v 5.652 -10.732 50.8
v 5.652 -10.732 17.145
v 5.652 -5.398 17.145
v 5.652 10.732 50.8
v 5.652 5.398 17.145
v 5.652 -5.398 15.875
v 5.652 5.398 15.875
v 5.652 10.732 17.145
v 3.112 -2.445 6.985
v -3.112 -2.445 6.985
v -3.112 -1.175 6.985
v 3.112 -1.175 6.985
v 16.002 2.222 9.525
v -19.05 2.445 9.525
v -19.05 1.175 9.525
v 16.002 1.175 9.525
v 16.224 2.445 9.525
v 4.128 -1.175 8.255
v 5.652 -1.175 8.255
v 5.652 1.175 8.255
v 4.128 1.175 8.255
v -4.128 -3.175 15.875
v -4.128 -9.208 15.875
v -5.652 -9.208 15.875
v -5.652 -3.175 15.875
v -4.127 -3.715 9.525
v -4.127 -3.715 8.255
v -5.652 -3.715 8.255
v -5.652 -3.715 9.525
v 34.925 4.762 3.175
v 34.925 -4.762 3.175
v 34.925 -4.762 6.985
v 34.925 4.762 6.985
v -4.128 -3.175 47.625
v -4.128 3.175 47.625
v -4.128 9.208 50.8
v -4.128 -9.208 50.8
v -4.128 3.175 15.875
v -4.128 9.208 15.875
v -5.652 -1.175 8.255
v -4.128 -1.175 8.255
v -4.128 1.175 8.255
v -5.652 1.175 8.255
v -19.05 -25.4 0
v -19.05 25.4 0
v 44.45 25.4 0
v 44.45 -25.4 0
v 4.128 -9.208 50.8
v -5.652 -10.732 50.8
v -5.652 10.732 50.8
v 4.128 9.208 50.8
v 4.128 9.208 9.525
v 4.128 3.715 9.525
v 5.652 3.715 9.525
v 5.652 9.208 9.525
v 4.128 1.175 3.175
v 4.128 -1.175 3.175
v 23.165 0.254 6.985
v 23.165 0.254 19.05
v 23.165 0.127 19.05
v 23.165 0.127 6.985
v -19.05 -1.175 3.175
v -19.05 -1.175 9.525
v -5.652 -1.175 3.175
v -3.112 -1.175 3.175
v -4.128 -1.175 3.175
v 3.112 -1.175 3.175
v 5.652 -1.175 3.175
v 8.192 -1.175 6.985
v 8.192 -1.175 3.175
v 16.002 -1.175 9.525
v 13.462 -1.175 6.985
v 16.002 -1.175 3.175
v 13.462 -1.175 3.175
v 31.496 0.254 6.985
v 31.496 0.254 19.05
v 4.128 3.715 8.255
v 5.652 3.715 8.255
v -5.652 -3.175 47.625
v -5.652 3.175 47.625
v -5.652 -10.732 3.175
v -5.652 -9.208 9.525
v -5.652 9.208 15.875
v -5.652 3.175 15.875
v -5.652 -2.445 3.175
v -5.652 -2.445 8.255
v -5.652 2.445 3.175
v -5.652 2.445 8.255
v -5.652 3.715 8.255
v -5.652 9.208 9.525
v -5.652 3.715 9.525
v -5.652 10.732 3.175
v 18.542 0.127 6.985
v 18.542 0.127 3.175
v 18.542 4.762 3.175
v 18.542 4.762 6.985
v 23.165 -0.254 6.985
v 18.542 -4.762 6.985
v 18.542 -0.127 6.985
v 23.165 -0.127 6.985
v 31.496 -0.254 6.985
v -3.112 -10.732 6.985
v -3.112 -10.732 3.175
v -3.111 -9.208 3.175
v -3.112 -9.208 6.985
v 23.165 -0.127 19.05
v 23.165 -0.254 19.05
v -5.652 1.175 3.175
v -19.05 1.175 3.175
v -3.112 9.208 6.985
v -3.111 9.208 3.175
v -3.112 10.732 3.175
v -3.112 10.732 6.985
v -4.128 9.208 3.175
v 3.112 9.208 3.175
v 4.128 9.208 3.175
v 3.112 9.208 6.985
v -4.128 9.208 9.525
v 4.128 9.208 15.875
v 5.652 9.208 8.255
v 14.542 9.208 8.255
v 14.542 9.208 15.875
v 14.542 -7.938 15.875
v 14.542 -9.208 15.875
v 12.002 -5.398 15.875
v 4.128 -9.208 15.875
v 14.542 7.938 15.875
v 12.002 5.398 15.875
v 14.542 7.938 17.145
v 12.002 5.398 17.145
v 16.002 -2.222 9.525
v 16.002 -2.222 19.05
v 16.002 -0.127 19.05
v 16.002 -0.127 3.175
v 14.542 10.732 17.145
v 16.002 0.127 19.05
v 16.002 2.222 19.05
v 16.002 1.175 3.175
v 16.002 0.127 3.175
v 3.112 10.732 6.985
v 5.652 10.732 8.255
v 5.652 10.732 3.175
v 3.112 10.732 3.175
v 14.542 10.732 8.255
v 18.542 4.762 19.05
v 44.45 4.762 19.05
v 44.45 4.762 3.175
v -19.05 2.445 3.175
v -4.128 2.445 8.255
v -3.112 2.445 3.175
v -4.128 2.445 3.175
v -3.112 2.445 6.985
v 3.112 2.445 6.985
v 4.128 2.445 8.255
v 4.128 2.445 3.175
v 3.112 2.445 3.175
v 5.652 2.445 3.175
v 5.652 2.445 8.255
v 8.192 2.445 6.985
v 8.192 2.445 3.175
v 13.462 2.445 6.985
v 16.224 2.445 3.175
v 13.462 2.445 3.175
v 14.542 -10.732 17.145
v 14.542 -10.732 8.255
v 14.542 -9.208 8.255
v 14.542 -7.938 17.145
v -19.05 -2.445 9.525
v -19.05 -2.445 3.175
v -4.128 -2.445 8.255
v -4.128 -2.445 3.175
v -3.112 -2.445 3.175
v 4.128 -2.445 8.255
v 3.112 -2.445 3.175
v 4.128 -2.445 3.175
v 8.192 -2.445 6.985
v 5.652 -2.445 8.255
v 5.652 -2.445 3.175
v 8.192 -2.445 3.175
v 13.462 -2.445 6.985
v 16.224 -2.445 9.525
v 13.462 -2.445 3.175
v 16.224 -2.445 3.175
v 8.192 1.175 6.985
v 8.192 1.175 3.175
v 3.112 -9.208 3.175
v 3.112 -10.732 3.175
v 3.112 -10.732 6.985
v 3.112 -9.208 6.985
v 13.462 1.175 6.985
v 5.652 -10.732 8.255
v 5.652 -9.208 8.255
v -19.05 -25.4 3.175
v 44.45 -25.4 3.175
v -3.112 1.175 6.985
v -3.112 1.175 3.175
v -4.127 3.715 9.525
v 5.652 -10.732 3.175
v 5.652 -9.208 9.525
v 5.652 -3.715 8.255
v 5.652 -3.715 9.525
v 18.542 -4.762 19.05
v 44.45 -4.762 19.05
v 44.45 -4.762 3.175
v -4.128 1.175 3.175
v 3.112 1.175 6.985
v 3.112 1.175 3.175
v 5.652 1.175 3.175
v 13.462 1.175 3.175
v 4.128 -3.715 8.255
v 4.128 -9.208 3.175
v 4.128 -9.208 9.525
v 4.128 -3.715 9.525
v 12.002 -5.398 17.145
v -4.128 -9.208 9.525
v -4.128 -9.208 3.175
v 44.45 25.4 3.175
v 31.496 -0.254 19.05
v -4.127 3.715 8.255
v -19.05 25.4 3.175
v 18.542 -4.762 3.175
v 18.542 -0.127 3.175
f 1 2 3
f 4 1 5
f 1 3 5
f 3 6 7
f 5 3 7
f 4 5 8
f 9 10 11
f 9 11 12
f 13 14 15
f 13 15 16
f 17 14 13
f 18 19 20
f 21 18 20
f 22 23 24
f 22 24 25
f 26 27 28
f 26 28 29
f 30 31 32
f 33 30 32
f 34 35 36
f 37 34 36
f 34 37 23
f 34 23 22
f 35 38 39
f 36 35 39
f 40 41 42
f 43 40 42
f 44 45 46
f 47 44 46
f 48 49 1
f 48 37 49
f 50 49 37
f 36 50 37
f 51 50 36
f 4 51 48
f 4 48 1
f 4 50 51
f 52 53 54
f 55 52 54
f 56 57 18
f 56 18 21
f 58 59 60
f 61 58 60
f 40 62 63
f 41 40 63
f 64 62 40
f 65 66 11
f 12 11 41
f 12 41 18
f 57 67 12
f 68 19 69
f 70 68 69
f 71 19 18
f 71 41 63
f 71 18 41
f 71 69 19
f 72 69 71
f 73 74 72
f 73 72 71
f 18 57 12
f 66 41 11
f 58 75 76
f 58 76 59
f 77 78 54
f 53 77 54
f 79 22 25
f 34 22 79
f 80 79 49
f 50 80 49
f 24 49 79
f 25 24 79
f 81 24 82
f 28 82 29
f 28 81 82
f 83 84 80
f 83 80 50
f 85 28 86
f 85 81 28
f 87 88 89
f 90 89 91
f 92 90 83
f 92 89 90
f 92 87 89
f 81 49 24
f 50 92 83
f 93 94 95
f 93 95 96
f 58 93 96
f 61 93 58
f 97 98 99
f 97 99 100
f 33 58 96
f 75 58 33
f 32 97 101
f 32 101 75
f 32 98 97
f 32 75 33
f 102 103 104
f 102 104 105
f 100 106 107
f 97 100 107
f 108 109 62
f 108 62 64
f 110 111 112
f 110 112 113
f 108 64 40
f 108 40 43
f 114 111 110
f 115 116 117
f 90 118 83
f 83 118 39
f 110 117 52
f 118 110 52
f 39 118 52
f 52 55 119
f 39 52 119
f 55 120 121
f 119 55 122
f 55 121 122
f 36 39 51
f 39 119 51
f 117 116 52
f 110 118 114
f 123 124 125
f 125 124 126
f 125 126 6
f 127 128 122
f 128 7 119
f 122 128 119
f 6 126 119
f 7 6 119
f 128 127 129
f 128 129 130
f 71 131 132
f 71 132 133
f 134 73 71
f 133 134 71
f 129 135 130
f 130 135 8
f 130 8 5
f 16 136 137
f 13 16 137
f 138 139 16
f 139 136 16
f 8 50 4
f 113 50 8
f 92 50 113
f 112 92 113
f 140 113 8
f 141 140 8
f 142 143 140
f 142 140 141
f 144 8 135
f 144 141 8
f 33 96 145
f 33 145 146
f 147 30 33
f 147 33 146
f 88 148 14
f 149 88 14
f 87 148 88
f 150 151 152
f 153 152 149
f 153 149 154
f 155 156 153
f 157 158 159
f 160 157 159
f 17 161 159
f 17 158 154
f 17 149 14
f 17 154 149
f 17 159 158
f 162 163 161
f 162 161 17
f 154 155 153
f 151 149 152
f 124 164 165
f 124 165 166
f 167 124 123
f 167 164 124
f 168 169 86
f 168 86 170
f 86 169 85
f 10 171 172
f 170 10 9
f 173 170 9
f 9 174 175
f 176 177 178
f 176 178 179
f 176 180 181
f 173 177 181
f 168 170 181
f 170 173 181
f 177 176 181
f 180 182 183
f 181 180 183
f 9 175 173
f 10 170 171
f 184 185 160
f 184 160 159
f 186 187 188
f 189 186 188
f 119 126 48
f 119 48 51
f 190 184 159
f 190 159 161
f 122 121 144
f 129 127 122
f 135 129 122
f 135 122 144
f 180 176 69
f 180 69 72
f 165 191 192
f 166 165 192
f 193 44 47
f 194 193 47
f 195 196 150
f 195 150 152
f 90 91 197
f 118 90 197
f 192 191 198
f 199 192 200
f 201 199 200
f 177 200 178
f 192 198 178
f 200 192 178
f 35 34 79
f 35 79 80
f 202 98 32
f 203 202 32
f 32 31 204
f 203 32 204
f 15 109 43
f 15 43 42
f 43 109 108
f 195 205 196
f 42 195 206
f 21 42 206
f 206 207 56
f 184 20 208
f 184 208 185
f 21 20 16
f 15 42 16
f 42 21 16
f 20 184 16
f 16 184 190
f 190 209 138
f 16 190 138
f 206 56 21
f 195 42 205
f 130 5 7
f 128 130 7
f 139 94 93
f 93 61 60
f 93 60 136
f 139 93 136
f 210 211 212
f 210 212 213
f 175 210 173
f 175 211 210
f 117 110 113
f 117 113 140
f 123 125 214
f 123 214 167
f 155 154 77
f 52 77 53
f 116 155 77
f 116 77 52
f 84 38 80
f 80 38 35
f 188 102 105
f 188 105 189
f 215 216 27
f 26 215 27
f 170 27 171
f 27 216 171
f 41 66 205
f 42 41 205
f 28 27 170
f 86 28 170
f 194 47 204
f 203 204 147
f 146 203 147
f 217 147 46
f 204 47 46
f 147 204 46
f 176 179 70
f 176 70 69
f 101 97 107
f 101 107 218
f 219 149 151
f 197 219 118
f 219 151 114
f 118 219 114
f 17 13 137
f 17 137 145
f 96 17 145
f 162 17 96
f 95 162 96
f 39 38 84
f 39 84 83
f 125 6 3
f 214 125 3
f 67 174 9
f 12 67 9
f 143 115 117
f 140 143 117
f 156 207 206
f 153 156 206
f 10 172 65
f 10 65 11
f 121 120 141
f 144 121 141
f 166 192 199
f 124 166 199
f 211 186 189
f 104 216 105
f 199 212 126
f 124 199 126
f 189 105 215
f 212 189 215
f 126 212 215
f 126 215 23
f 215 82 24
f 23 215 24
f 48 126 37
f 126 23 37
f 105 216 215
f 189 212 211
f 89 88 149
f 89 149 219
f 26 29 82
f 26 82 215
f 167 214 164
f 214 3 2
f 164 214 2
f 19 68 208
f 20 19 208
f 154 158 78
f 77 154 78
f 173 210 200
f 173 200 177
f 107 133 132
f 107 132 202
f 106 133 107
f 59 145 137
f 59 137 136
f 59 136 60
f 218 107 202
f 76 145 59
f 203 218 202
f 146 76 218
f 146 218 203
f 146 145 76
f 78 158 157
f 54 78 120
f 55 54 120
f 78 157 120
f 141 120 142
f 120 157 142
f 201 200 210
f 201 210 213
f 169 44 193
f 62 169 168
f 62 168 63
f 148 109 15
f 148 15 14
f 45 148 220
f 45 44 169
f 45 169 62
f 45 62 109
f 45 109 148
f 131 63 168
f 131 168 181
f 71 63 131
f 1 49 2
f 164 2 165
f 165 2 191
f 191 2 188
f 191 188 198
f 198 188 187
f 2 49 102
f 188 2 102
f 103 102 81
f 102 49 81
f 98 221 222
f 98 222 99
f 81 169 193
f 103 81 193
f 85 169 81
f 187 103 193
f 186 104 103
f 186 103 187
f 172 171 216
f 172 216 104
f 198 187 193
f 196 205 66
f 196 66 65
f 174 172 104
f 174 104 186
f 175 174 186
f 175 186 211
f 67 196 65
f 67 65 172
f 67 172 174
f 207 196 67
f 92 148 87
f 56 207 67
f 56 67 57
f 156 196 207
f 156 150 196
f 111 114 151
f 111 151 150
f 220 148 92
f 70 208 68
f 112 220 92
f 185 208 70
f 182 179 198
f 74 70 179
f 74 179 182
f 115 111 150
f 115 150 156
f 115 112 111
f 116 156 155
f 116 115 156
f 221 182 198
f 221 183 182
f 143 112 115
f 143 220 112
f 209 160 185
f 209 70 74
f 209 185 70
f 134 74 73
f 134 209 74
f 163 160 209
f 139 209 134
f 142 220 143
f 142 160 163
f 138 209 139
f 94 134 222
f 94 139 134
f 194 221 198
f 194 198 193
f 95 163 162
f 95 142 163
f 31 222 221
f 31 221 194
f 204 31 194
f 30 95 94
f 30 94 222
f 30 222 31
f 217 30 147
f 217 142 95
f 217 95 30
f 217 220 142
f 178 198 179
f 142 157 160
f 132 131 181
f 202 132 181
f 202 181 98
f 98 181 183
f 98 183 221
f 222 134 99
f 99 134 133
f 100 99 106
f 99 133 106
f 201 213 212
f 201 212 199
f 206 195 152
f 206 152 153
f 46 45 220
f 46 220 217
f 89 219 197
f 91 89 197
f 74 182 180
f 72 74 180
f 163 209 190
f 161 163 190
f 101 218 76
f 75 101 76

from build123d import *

# Parameters (mm, degrees)
F0_W          = 11.303
F0_H          = 21.463
F0_W_2        = 8.255
F0_H_2        = 18.415
F1_DEPTH      = 50.8
F2_W          = 18.415
F2_H          = 6.35
F3_DEPTH      = 12.7
F4_W          = 6.35
F4_H          = 31.75
F5_DEPTH      = 25.4
F6_W          = 63.5
F6_H          = 50.8
F7_DEPTH      = 3.175
F8_W          = 28.448
F8_H          = 9.525
F9_DEPTH      = 15.875
F11_DEPTH     = 15.875
F12_W         = 35.052
F12_H         = 1.27
F13_DEPTH     = 6.35
F14_W         = 1.27
F14_H         = 1.27
F14_W_2       = 2.3495
F15_DEPTH     = 24.7025
F16_W         = 6.223
F16_H         = 3.81
F16_W_2       = 5.2705
F16_W_3       = 16.383
F17_DEPTH     = 36.1325
F19_DEPTH     = 8.89
F20_T1_DEPTH  = 14.3341495789
F20_T6_DEPTH  = 22.4070747894
F20_T11_DEPTH = 28.9391495789
F20_T16_DEPTH = 22.4070747894
F20_T21_DEPTH = 28.9391495789


# Not quite as in the source:
# - a fillet or chamfer that OpenCascade refuses, or shapes differently, is made with other operations: its cross-section is extruded or revolved along the edge and cut away or added


with BuildPart() as f1:
    # F0 (on Top) → F1 (new body)
    with BuildSketch(Plane.XY):
        Rectangle(F0_W, F0_H)
        Rectangle(F0_W_2, F0_H_2, mode=Mode.SUBTRACT)
    extrude(amount=F1_DEPTH)

    # F2 (on Right) → F3 (cut, symmetric)
    with BuildSketch(Plane.YZ):
        with Locations((0, 12.7)):
            Rectangle(F2_W, F2_H)
    extrude(amount=F3_DEPTH, both=True, mode=Mode.SUBTRACT)

    # F4 (on Right) → F5 (cut)
    with BuildSketch(Plane.YZ):
        with Locations((0, 31.75)):
            Rectangle(F4_W, F4_H)
    extrude(amount=-F5_DEPTH, mode=Mode.SUBTRACT)

    # F6 (on Top) → F7 (join)
    with BuildSketch(Plane.XY):
        with Locations((12.7, 0)):
            Rectangle(F6_W, F6_H)
    extrude(amount=F7_DEPTH)

    # F8 (on face) → F9 (join)
    with BuildSketch(Plane.XY.offset(3.175)):
        with Locations((30.226, 0)):
            Rectangle(F8_W, F8_H)
    extrude(amount=F9_DEPTH)

    # F10 (on face) → F11 (cut, through all)
    with BuildSketch(Plane.XY.offset(19.05)):
        Polygon((11.684, 0.127), (11.684, -0.127), (23.1648, -0.127), (23.1648, -0.254), (31.496, -0.254), (31.496, 0.254), (23.1648, 0.254), (23.1648, 0.127), align=None)
    extrude(amount=-F11_DEPTH, mode=Mode.SUBTRACT)

    # F12 (on face) → F13 (join)
    with BuildSketch(Plane.XY.offset(3.175)):
        with Locations((-1.524, 1.80975)):
            Rectangle(F12_W, F12_H)
        with Locations((-1.524, -1.80975)):
            Rectangle(F12_W, F12_H)
    extrude(amount=F13_DEPTH)

    # F14 (on face) → F15 (cut, through all)
    with BuildSketch(Plane.YZ.offset(5.6515)):
        with Locations((-3.07975, 8.89)):
            Rectangle(F14_W, F14_H)
        with Locations((0, 8.89)):
            Rectangle(F14_W_2, F14_H)
        with Locations((3.07975, 8.89)):
            Rectangle(F14_W, F14_H)
    extrude(amount=-F15_DEPTH, mode=Mode.SUBTRACT)

    # F16 (on face) → F17 (cut, through all)
    with BuildSketch(Plane.XZ.offset(10.7315)):
        with Locations((0, 5.08)):
            Rectangle(F16_W, F16_H)
        with Locations((10.82675, 5.08)):
            Rectangle(F16_W_2, F16_H)
        with Locations((26.7335, 5.08)):
            Rectangle(F16_W_3, F16_H)
    extrude(amount=-F17_DEPTH, mode=Mode.SUBTRACT)

    # F18 (on face) → F19 (join)
    with BuildSketch(Plane.YZ.offset(5.6515)):
        Polygon((-9.2075, 15.875), (-5.3975, 15.875), (-5.3975, 17.145), (-10.7315, 17.145), (-10.7315, 8.255), (-9.2075, 8.255), align=None)
        Polygon((10.7315, 17.145), (5.3975, 17.145), (5.3975, 15.875), (9.2075, 15.875), (9.2075, 8.255), (10.7315, 8.255), align=None)
    extrude(amount=F19_DEPTH)

    # F20: chamfer of 2.54 on 4 edges, made by hand

    # F20_s2 → F20_t1 (cut)
    with BuildSketch(Plane.XY.offset(9.3429252106)):
        Polygon((14.5415, 7.9375), (12.0015, 5.3975), (14.5415, 5.3975), align=None)
        Polygon((12.0015, -5.3975), (14.5415, -7.9375), (14.5415, -5.3975), align=None)
    extrude(amount=F20_T1_DEPTH, mode=Mode.SUBTRACT)


with BuildPart() as f20_tool4:
    # F20_s5 → F20_t6 (new body)
    with BuildSketch(Plane.XY.offset(3.175)):
        Polygon((16.002, -2.2225), (18.542, -4.7625), (16.002, -4.7625), align=None)
    extrude(amount=F20_T6_DEPTH)

    split(bisect_by=Plane.XZ.offset(2.44475), keep=Keep.TOP)


with BuildPart() as f1_1:
    add(f1.part)

    # F20_t3: cut F20_tool4
    add(f20_tool4.part, mode=Mode.SUBTRACT)


with BuildPart() as f20_tool9:
    # F20_s10 → F20_t11 (new body)
    with BuildSketch(Plane.XY.offset(-3.3570747894)):
        Polygon((16.002, -2.2225), (18.542, -4.7625), (16.002, -4.7625), align=None)
    extrude(amount=F20_T11_DEPTH)

    split(bisect_by=Plane.XY.offset(9.525), keep=Keep.TOP)


with BuildPart() as f1_2:
    add(f1_1.part)

    # F20_t8: cut F20_tool9
    add(f20_tool9.part, mode=Mode.SUBTRACT)


with BuildPart() as f20_tool14:
    # F20_s15 → F20_t16 (new body)
    with BuildSketch(Plane.XY.offset(3.175)):
        Polygon((16.002, 2.2225), (18.542, 4.7625), (16.002, 4.7625), align=None)
    extrude(amount=F20_T16_DEPTH)

    split(bisect_by=Plane.XZ.offset(-2.44475), keep=Keep.BOTTOM)


with BuildPart() as f1_3:
    add(f1_2.part)

    # F20_t13: cut F20_tool14
    add(f20_tool14.part, mode=Mode.SUBTRACT)


with BuildPart() as f20_tool19:
    # F20_s20 → F20_t21 (new body)
    with BuildSketch(Plane.XY.offset(-3.3570747894)):
        Polygon((16.002, 2.2225), (18.542, 4.7625), (16.002, 4.7625), align=None)
    extrude(amount=F20_T21_DEPTH)

    split(bisect_by=Plane.XY.offset(9.525), keep=Keep.TOP)


with BuildPart() as f1_4:
    add(f1_3.part)

    # F20_t18: cut F20_tool19
    add(f20_tool19.part, mode=Mode.SUBTRACT)


solid = f1_4.part
